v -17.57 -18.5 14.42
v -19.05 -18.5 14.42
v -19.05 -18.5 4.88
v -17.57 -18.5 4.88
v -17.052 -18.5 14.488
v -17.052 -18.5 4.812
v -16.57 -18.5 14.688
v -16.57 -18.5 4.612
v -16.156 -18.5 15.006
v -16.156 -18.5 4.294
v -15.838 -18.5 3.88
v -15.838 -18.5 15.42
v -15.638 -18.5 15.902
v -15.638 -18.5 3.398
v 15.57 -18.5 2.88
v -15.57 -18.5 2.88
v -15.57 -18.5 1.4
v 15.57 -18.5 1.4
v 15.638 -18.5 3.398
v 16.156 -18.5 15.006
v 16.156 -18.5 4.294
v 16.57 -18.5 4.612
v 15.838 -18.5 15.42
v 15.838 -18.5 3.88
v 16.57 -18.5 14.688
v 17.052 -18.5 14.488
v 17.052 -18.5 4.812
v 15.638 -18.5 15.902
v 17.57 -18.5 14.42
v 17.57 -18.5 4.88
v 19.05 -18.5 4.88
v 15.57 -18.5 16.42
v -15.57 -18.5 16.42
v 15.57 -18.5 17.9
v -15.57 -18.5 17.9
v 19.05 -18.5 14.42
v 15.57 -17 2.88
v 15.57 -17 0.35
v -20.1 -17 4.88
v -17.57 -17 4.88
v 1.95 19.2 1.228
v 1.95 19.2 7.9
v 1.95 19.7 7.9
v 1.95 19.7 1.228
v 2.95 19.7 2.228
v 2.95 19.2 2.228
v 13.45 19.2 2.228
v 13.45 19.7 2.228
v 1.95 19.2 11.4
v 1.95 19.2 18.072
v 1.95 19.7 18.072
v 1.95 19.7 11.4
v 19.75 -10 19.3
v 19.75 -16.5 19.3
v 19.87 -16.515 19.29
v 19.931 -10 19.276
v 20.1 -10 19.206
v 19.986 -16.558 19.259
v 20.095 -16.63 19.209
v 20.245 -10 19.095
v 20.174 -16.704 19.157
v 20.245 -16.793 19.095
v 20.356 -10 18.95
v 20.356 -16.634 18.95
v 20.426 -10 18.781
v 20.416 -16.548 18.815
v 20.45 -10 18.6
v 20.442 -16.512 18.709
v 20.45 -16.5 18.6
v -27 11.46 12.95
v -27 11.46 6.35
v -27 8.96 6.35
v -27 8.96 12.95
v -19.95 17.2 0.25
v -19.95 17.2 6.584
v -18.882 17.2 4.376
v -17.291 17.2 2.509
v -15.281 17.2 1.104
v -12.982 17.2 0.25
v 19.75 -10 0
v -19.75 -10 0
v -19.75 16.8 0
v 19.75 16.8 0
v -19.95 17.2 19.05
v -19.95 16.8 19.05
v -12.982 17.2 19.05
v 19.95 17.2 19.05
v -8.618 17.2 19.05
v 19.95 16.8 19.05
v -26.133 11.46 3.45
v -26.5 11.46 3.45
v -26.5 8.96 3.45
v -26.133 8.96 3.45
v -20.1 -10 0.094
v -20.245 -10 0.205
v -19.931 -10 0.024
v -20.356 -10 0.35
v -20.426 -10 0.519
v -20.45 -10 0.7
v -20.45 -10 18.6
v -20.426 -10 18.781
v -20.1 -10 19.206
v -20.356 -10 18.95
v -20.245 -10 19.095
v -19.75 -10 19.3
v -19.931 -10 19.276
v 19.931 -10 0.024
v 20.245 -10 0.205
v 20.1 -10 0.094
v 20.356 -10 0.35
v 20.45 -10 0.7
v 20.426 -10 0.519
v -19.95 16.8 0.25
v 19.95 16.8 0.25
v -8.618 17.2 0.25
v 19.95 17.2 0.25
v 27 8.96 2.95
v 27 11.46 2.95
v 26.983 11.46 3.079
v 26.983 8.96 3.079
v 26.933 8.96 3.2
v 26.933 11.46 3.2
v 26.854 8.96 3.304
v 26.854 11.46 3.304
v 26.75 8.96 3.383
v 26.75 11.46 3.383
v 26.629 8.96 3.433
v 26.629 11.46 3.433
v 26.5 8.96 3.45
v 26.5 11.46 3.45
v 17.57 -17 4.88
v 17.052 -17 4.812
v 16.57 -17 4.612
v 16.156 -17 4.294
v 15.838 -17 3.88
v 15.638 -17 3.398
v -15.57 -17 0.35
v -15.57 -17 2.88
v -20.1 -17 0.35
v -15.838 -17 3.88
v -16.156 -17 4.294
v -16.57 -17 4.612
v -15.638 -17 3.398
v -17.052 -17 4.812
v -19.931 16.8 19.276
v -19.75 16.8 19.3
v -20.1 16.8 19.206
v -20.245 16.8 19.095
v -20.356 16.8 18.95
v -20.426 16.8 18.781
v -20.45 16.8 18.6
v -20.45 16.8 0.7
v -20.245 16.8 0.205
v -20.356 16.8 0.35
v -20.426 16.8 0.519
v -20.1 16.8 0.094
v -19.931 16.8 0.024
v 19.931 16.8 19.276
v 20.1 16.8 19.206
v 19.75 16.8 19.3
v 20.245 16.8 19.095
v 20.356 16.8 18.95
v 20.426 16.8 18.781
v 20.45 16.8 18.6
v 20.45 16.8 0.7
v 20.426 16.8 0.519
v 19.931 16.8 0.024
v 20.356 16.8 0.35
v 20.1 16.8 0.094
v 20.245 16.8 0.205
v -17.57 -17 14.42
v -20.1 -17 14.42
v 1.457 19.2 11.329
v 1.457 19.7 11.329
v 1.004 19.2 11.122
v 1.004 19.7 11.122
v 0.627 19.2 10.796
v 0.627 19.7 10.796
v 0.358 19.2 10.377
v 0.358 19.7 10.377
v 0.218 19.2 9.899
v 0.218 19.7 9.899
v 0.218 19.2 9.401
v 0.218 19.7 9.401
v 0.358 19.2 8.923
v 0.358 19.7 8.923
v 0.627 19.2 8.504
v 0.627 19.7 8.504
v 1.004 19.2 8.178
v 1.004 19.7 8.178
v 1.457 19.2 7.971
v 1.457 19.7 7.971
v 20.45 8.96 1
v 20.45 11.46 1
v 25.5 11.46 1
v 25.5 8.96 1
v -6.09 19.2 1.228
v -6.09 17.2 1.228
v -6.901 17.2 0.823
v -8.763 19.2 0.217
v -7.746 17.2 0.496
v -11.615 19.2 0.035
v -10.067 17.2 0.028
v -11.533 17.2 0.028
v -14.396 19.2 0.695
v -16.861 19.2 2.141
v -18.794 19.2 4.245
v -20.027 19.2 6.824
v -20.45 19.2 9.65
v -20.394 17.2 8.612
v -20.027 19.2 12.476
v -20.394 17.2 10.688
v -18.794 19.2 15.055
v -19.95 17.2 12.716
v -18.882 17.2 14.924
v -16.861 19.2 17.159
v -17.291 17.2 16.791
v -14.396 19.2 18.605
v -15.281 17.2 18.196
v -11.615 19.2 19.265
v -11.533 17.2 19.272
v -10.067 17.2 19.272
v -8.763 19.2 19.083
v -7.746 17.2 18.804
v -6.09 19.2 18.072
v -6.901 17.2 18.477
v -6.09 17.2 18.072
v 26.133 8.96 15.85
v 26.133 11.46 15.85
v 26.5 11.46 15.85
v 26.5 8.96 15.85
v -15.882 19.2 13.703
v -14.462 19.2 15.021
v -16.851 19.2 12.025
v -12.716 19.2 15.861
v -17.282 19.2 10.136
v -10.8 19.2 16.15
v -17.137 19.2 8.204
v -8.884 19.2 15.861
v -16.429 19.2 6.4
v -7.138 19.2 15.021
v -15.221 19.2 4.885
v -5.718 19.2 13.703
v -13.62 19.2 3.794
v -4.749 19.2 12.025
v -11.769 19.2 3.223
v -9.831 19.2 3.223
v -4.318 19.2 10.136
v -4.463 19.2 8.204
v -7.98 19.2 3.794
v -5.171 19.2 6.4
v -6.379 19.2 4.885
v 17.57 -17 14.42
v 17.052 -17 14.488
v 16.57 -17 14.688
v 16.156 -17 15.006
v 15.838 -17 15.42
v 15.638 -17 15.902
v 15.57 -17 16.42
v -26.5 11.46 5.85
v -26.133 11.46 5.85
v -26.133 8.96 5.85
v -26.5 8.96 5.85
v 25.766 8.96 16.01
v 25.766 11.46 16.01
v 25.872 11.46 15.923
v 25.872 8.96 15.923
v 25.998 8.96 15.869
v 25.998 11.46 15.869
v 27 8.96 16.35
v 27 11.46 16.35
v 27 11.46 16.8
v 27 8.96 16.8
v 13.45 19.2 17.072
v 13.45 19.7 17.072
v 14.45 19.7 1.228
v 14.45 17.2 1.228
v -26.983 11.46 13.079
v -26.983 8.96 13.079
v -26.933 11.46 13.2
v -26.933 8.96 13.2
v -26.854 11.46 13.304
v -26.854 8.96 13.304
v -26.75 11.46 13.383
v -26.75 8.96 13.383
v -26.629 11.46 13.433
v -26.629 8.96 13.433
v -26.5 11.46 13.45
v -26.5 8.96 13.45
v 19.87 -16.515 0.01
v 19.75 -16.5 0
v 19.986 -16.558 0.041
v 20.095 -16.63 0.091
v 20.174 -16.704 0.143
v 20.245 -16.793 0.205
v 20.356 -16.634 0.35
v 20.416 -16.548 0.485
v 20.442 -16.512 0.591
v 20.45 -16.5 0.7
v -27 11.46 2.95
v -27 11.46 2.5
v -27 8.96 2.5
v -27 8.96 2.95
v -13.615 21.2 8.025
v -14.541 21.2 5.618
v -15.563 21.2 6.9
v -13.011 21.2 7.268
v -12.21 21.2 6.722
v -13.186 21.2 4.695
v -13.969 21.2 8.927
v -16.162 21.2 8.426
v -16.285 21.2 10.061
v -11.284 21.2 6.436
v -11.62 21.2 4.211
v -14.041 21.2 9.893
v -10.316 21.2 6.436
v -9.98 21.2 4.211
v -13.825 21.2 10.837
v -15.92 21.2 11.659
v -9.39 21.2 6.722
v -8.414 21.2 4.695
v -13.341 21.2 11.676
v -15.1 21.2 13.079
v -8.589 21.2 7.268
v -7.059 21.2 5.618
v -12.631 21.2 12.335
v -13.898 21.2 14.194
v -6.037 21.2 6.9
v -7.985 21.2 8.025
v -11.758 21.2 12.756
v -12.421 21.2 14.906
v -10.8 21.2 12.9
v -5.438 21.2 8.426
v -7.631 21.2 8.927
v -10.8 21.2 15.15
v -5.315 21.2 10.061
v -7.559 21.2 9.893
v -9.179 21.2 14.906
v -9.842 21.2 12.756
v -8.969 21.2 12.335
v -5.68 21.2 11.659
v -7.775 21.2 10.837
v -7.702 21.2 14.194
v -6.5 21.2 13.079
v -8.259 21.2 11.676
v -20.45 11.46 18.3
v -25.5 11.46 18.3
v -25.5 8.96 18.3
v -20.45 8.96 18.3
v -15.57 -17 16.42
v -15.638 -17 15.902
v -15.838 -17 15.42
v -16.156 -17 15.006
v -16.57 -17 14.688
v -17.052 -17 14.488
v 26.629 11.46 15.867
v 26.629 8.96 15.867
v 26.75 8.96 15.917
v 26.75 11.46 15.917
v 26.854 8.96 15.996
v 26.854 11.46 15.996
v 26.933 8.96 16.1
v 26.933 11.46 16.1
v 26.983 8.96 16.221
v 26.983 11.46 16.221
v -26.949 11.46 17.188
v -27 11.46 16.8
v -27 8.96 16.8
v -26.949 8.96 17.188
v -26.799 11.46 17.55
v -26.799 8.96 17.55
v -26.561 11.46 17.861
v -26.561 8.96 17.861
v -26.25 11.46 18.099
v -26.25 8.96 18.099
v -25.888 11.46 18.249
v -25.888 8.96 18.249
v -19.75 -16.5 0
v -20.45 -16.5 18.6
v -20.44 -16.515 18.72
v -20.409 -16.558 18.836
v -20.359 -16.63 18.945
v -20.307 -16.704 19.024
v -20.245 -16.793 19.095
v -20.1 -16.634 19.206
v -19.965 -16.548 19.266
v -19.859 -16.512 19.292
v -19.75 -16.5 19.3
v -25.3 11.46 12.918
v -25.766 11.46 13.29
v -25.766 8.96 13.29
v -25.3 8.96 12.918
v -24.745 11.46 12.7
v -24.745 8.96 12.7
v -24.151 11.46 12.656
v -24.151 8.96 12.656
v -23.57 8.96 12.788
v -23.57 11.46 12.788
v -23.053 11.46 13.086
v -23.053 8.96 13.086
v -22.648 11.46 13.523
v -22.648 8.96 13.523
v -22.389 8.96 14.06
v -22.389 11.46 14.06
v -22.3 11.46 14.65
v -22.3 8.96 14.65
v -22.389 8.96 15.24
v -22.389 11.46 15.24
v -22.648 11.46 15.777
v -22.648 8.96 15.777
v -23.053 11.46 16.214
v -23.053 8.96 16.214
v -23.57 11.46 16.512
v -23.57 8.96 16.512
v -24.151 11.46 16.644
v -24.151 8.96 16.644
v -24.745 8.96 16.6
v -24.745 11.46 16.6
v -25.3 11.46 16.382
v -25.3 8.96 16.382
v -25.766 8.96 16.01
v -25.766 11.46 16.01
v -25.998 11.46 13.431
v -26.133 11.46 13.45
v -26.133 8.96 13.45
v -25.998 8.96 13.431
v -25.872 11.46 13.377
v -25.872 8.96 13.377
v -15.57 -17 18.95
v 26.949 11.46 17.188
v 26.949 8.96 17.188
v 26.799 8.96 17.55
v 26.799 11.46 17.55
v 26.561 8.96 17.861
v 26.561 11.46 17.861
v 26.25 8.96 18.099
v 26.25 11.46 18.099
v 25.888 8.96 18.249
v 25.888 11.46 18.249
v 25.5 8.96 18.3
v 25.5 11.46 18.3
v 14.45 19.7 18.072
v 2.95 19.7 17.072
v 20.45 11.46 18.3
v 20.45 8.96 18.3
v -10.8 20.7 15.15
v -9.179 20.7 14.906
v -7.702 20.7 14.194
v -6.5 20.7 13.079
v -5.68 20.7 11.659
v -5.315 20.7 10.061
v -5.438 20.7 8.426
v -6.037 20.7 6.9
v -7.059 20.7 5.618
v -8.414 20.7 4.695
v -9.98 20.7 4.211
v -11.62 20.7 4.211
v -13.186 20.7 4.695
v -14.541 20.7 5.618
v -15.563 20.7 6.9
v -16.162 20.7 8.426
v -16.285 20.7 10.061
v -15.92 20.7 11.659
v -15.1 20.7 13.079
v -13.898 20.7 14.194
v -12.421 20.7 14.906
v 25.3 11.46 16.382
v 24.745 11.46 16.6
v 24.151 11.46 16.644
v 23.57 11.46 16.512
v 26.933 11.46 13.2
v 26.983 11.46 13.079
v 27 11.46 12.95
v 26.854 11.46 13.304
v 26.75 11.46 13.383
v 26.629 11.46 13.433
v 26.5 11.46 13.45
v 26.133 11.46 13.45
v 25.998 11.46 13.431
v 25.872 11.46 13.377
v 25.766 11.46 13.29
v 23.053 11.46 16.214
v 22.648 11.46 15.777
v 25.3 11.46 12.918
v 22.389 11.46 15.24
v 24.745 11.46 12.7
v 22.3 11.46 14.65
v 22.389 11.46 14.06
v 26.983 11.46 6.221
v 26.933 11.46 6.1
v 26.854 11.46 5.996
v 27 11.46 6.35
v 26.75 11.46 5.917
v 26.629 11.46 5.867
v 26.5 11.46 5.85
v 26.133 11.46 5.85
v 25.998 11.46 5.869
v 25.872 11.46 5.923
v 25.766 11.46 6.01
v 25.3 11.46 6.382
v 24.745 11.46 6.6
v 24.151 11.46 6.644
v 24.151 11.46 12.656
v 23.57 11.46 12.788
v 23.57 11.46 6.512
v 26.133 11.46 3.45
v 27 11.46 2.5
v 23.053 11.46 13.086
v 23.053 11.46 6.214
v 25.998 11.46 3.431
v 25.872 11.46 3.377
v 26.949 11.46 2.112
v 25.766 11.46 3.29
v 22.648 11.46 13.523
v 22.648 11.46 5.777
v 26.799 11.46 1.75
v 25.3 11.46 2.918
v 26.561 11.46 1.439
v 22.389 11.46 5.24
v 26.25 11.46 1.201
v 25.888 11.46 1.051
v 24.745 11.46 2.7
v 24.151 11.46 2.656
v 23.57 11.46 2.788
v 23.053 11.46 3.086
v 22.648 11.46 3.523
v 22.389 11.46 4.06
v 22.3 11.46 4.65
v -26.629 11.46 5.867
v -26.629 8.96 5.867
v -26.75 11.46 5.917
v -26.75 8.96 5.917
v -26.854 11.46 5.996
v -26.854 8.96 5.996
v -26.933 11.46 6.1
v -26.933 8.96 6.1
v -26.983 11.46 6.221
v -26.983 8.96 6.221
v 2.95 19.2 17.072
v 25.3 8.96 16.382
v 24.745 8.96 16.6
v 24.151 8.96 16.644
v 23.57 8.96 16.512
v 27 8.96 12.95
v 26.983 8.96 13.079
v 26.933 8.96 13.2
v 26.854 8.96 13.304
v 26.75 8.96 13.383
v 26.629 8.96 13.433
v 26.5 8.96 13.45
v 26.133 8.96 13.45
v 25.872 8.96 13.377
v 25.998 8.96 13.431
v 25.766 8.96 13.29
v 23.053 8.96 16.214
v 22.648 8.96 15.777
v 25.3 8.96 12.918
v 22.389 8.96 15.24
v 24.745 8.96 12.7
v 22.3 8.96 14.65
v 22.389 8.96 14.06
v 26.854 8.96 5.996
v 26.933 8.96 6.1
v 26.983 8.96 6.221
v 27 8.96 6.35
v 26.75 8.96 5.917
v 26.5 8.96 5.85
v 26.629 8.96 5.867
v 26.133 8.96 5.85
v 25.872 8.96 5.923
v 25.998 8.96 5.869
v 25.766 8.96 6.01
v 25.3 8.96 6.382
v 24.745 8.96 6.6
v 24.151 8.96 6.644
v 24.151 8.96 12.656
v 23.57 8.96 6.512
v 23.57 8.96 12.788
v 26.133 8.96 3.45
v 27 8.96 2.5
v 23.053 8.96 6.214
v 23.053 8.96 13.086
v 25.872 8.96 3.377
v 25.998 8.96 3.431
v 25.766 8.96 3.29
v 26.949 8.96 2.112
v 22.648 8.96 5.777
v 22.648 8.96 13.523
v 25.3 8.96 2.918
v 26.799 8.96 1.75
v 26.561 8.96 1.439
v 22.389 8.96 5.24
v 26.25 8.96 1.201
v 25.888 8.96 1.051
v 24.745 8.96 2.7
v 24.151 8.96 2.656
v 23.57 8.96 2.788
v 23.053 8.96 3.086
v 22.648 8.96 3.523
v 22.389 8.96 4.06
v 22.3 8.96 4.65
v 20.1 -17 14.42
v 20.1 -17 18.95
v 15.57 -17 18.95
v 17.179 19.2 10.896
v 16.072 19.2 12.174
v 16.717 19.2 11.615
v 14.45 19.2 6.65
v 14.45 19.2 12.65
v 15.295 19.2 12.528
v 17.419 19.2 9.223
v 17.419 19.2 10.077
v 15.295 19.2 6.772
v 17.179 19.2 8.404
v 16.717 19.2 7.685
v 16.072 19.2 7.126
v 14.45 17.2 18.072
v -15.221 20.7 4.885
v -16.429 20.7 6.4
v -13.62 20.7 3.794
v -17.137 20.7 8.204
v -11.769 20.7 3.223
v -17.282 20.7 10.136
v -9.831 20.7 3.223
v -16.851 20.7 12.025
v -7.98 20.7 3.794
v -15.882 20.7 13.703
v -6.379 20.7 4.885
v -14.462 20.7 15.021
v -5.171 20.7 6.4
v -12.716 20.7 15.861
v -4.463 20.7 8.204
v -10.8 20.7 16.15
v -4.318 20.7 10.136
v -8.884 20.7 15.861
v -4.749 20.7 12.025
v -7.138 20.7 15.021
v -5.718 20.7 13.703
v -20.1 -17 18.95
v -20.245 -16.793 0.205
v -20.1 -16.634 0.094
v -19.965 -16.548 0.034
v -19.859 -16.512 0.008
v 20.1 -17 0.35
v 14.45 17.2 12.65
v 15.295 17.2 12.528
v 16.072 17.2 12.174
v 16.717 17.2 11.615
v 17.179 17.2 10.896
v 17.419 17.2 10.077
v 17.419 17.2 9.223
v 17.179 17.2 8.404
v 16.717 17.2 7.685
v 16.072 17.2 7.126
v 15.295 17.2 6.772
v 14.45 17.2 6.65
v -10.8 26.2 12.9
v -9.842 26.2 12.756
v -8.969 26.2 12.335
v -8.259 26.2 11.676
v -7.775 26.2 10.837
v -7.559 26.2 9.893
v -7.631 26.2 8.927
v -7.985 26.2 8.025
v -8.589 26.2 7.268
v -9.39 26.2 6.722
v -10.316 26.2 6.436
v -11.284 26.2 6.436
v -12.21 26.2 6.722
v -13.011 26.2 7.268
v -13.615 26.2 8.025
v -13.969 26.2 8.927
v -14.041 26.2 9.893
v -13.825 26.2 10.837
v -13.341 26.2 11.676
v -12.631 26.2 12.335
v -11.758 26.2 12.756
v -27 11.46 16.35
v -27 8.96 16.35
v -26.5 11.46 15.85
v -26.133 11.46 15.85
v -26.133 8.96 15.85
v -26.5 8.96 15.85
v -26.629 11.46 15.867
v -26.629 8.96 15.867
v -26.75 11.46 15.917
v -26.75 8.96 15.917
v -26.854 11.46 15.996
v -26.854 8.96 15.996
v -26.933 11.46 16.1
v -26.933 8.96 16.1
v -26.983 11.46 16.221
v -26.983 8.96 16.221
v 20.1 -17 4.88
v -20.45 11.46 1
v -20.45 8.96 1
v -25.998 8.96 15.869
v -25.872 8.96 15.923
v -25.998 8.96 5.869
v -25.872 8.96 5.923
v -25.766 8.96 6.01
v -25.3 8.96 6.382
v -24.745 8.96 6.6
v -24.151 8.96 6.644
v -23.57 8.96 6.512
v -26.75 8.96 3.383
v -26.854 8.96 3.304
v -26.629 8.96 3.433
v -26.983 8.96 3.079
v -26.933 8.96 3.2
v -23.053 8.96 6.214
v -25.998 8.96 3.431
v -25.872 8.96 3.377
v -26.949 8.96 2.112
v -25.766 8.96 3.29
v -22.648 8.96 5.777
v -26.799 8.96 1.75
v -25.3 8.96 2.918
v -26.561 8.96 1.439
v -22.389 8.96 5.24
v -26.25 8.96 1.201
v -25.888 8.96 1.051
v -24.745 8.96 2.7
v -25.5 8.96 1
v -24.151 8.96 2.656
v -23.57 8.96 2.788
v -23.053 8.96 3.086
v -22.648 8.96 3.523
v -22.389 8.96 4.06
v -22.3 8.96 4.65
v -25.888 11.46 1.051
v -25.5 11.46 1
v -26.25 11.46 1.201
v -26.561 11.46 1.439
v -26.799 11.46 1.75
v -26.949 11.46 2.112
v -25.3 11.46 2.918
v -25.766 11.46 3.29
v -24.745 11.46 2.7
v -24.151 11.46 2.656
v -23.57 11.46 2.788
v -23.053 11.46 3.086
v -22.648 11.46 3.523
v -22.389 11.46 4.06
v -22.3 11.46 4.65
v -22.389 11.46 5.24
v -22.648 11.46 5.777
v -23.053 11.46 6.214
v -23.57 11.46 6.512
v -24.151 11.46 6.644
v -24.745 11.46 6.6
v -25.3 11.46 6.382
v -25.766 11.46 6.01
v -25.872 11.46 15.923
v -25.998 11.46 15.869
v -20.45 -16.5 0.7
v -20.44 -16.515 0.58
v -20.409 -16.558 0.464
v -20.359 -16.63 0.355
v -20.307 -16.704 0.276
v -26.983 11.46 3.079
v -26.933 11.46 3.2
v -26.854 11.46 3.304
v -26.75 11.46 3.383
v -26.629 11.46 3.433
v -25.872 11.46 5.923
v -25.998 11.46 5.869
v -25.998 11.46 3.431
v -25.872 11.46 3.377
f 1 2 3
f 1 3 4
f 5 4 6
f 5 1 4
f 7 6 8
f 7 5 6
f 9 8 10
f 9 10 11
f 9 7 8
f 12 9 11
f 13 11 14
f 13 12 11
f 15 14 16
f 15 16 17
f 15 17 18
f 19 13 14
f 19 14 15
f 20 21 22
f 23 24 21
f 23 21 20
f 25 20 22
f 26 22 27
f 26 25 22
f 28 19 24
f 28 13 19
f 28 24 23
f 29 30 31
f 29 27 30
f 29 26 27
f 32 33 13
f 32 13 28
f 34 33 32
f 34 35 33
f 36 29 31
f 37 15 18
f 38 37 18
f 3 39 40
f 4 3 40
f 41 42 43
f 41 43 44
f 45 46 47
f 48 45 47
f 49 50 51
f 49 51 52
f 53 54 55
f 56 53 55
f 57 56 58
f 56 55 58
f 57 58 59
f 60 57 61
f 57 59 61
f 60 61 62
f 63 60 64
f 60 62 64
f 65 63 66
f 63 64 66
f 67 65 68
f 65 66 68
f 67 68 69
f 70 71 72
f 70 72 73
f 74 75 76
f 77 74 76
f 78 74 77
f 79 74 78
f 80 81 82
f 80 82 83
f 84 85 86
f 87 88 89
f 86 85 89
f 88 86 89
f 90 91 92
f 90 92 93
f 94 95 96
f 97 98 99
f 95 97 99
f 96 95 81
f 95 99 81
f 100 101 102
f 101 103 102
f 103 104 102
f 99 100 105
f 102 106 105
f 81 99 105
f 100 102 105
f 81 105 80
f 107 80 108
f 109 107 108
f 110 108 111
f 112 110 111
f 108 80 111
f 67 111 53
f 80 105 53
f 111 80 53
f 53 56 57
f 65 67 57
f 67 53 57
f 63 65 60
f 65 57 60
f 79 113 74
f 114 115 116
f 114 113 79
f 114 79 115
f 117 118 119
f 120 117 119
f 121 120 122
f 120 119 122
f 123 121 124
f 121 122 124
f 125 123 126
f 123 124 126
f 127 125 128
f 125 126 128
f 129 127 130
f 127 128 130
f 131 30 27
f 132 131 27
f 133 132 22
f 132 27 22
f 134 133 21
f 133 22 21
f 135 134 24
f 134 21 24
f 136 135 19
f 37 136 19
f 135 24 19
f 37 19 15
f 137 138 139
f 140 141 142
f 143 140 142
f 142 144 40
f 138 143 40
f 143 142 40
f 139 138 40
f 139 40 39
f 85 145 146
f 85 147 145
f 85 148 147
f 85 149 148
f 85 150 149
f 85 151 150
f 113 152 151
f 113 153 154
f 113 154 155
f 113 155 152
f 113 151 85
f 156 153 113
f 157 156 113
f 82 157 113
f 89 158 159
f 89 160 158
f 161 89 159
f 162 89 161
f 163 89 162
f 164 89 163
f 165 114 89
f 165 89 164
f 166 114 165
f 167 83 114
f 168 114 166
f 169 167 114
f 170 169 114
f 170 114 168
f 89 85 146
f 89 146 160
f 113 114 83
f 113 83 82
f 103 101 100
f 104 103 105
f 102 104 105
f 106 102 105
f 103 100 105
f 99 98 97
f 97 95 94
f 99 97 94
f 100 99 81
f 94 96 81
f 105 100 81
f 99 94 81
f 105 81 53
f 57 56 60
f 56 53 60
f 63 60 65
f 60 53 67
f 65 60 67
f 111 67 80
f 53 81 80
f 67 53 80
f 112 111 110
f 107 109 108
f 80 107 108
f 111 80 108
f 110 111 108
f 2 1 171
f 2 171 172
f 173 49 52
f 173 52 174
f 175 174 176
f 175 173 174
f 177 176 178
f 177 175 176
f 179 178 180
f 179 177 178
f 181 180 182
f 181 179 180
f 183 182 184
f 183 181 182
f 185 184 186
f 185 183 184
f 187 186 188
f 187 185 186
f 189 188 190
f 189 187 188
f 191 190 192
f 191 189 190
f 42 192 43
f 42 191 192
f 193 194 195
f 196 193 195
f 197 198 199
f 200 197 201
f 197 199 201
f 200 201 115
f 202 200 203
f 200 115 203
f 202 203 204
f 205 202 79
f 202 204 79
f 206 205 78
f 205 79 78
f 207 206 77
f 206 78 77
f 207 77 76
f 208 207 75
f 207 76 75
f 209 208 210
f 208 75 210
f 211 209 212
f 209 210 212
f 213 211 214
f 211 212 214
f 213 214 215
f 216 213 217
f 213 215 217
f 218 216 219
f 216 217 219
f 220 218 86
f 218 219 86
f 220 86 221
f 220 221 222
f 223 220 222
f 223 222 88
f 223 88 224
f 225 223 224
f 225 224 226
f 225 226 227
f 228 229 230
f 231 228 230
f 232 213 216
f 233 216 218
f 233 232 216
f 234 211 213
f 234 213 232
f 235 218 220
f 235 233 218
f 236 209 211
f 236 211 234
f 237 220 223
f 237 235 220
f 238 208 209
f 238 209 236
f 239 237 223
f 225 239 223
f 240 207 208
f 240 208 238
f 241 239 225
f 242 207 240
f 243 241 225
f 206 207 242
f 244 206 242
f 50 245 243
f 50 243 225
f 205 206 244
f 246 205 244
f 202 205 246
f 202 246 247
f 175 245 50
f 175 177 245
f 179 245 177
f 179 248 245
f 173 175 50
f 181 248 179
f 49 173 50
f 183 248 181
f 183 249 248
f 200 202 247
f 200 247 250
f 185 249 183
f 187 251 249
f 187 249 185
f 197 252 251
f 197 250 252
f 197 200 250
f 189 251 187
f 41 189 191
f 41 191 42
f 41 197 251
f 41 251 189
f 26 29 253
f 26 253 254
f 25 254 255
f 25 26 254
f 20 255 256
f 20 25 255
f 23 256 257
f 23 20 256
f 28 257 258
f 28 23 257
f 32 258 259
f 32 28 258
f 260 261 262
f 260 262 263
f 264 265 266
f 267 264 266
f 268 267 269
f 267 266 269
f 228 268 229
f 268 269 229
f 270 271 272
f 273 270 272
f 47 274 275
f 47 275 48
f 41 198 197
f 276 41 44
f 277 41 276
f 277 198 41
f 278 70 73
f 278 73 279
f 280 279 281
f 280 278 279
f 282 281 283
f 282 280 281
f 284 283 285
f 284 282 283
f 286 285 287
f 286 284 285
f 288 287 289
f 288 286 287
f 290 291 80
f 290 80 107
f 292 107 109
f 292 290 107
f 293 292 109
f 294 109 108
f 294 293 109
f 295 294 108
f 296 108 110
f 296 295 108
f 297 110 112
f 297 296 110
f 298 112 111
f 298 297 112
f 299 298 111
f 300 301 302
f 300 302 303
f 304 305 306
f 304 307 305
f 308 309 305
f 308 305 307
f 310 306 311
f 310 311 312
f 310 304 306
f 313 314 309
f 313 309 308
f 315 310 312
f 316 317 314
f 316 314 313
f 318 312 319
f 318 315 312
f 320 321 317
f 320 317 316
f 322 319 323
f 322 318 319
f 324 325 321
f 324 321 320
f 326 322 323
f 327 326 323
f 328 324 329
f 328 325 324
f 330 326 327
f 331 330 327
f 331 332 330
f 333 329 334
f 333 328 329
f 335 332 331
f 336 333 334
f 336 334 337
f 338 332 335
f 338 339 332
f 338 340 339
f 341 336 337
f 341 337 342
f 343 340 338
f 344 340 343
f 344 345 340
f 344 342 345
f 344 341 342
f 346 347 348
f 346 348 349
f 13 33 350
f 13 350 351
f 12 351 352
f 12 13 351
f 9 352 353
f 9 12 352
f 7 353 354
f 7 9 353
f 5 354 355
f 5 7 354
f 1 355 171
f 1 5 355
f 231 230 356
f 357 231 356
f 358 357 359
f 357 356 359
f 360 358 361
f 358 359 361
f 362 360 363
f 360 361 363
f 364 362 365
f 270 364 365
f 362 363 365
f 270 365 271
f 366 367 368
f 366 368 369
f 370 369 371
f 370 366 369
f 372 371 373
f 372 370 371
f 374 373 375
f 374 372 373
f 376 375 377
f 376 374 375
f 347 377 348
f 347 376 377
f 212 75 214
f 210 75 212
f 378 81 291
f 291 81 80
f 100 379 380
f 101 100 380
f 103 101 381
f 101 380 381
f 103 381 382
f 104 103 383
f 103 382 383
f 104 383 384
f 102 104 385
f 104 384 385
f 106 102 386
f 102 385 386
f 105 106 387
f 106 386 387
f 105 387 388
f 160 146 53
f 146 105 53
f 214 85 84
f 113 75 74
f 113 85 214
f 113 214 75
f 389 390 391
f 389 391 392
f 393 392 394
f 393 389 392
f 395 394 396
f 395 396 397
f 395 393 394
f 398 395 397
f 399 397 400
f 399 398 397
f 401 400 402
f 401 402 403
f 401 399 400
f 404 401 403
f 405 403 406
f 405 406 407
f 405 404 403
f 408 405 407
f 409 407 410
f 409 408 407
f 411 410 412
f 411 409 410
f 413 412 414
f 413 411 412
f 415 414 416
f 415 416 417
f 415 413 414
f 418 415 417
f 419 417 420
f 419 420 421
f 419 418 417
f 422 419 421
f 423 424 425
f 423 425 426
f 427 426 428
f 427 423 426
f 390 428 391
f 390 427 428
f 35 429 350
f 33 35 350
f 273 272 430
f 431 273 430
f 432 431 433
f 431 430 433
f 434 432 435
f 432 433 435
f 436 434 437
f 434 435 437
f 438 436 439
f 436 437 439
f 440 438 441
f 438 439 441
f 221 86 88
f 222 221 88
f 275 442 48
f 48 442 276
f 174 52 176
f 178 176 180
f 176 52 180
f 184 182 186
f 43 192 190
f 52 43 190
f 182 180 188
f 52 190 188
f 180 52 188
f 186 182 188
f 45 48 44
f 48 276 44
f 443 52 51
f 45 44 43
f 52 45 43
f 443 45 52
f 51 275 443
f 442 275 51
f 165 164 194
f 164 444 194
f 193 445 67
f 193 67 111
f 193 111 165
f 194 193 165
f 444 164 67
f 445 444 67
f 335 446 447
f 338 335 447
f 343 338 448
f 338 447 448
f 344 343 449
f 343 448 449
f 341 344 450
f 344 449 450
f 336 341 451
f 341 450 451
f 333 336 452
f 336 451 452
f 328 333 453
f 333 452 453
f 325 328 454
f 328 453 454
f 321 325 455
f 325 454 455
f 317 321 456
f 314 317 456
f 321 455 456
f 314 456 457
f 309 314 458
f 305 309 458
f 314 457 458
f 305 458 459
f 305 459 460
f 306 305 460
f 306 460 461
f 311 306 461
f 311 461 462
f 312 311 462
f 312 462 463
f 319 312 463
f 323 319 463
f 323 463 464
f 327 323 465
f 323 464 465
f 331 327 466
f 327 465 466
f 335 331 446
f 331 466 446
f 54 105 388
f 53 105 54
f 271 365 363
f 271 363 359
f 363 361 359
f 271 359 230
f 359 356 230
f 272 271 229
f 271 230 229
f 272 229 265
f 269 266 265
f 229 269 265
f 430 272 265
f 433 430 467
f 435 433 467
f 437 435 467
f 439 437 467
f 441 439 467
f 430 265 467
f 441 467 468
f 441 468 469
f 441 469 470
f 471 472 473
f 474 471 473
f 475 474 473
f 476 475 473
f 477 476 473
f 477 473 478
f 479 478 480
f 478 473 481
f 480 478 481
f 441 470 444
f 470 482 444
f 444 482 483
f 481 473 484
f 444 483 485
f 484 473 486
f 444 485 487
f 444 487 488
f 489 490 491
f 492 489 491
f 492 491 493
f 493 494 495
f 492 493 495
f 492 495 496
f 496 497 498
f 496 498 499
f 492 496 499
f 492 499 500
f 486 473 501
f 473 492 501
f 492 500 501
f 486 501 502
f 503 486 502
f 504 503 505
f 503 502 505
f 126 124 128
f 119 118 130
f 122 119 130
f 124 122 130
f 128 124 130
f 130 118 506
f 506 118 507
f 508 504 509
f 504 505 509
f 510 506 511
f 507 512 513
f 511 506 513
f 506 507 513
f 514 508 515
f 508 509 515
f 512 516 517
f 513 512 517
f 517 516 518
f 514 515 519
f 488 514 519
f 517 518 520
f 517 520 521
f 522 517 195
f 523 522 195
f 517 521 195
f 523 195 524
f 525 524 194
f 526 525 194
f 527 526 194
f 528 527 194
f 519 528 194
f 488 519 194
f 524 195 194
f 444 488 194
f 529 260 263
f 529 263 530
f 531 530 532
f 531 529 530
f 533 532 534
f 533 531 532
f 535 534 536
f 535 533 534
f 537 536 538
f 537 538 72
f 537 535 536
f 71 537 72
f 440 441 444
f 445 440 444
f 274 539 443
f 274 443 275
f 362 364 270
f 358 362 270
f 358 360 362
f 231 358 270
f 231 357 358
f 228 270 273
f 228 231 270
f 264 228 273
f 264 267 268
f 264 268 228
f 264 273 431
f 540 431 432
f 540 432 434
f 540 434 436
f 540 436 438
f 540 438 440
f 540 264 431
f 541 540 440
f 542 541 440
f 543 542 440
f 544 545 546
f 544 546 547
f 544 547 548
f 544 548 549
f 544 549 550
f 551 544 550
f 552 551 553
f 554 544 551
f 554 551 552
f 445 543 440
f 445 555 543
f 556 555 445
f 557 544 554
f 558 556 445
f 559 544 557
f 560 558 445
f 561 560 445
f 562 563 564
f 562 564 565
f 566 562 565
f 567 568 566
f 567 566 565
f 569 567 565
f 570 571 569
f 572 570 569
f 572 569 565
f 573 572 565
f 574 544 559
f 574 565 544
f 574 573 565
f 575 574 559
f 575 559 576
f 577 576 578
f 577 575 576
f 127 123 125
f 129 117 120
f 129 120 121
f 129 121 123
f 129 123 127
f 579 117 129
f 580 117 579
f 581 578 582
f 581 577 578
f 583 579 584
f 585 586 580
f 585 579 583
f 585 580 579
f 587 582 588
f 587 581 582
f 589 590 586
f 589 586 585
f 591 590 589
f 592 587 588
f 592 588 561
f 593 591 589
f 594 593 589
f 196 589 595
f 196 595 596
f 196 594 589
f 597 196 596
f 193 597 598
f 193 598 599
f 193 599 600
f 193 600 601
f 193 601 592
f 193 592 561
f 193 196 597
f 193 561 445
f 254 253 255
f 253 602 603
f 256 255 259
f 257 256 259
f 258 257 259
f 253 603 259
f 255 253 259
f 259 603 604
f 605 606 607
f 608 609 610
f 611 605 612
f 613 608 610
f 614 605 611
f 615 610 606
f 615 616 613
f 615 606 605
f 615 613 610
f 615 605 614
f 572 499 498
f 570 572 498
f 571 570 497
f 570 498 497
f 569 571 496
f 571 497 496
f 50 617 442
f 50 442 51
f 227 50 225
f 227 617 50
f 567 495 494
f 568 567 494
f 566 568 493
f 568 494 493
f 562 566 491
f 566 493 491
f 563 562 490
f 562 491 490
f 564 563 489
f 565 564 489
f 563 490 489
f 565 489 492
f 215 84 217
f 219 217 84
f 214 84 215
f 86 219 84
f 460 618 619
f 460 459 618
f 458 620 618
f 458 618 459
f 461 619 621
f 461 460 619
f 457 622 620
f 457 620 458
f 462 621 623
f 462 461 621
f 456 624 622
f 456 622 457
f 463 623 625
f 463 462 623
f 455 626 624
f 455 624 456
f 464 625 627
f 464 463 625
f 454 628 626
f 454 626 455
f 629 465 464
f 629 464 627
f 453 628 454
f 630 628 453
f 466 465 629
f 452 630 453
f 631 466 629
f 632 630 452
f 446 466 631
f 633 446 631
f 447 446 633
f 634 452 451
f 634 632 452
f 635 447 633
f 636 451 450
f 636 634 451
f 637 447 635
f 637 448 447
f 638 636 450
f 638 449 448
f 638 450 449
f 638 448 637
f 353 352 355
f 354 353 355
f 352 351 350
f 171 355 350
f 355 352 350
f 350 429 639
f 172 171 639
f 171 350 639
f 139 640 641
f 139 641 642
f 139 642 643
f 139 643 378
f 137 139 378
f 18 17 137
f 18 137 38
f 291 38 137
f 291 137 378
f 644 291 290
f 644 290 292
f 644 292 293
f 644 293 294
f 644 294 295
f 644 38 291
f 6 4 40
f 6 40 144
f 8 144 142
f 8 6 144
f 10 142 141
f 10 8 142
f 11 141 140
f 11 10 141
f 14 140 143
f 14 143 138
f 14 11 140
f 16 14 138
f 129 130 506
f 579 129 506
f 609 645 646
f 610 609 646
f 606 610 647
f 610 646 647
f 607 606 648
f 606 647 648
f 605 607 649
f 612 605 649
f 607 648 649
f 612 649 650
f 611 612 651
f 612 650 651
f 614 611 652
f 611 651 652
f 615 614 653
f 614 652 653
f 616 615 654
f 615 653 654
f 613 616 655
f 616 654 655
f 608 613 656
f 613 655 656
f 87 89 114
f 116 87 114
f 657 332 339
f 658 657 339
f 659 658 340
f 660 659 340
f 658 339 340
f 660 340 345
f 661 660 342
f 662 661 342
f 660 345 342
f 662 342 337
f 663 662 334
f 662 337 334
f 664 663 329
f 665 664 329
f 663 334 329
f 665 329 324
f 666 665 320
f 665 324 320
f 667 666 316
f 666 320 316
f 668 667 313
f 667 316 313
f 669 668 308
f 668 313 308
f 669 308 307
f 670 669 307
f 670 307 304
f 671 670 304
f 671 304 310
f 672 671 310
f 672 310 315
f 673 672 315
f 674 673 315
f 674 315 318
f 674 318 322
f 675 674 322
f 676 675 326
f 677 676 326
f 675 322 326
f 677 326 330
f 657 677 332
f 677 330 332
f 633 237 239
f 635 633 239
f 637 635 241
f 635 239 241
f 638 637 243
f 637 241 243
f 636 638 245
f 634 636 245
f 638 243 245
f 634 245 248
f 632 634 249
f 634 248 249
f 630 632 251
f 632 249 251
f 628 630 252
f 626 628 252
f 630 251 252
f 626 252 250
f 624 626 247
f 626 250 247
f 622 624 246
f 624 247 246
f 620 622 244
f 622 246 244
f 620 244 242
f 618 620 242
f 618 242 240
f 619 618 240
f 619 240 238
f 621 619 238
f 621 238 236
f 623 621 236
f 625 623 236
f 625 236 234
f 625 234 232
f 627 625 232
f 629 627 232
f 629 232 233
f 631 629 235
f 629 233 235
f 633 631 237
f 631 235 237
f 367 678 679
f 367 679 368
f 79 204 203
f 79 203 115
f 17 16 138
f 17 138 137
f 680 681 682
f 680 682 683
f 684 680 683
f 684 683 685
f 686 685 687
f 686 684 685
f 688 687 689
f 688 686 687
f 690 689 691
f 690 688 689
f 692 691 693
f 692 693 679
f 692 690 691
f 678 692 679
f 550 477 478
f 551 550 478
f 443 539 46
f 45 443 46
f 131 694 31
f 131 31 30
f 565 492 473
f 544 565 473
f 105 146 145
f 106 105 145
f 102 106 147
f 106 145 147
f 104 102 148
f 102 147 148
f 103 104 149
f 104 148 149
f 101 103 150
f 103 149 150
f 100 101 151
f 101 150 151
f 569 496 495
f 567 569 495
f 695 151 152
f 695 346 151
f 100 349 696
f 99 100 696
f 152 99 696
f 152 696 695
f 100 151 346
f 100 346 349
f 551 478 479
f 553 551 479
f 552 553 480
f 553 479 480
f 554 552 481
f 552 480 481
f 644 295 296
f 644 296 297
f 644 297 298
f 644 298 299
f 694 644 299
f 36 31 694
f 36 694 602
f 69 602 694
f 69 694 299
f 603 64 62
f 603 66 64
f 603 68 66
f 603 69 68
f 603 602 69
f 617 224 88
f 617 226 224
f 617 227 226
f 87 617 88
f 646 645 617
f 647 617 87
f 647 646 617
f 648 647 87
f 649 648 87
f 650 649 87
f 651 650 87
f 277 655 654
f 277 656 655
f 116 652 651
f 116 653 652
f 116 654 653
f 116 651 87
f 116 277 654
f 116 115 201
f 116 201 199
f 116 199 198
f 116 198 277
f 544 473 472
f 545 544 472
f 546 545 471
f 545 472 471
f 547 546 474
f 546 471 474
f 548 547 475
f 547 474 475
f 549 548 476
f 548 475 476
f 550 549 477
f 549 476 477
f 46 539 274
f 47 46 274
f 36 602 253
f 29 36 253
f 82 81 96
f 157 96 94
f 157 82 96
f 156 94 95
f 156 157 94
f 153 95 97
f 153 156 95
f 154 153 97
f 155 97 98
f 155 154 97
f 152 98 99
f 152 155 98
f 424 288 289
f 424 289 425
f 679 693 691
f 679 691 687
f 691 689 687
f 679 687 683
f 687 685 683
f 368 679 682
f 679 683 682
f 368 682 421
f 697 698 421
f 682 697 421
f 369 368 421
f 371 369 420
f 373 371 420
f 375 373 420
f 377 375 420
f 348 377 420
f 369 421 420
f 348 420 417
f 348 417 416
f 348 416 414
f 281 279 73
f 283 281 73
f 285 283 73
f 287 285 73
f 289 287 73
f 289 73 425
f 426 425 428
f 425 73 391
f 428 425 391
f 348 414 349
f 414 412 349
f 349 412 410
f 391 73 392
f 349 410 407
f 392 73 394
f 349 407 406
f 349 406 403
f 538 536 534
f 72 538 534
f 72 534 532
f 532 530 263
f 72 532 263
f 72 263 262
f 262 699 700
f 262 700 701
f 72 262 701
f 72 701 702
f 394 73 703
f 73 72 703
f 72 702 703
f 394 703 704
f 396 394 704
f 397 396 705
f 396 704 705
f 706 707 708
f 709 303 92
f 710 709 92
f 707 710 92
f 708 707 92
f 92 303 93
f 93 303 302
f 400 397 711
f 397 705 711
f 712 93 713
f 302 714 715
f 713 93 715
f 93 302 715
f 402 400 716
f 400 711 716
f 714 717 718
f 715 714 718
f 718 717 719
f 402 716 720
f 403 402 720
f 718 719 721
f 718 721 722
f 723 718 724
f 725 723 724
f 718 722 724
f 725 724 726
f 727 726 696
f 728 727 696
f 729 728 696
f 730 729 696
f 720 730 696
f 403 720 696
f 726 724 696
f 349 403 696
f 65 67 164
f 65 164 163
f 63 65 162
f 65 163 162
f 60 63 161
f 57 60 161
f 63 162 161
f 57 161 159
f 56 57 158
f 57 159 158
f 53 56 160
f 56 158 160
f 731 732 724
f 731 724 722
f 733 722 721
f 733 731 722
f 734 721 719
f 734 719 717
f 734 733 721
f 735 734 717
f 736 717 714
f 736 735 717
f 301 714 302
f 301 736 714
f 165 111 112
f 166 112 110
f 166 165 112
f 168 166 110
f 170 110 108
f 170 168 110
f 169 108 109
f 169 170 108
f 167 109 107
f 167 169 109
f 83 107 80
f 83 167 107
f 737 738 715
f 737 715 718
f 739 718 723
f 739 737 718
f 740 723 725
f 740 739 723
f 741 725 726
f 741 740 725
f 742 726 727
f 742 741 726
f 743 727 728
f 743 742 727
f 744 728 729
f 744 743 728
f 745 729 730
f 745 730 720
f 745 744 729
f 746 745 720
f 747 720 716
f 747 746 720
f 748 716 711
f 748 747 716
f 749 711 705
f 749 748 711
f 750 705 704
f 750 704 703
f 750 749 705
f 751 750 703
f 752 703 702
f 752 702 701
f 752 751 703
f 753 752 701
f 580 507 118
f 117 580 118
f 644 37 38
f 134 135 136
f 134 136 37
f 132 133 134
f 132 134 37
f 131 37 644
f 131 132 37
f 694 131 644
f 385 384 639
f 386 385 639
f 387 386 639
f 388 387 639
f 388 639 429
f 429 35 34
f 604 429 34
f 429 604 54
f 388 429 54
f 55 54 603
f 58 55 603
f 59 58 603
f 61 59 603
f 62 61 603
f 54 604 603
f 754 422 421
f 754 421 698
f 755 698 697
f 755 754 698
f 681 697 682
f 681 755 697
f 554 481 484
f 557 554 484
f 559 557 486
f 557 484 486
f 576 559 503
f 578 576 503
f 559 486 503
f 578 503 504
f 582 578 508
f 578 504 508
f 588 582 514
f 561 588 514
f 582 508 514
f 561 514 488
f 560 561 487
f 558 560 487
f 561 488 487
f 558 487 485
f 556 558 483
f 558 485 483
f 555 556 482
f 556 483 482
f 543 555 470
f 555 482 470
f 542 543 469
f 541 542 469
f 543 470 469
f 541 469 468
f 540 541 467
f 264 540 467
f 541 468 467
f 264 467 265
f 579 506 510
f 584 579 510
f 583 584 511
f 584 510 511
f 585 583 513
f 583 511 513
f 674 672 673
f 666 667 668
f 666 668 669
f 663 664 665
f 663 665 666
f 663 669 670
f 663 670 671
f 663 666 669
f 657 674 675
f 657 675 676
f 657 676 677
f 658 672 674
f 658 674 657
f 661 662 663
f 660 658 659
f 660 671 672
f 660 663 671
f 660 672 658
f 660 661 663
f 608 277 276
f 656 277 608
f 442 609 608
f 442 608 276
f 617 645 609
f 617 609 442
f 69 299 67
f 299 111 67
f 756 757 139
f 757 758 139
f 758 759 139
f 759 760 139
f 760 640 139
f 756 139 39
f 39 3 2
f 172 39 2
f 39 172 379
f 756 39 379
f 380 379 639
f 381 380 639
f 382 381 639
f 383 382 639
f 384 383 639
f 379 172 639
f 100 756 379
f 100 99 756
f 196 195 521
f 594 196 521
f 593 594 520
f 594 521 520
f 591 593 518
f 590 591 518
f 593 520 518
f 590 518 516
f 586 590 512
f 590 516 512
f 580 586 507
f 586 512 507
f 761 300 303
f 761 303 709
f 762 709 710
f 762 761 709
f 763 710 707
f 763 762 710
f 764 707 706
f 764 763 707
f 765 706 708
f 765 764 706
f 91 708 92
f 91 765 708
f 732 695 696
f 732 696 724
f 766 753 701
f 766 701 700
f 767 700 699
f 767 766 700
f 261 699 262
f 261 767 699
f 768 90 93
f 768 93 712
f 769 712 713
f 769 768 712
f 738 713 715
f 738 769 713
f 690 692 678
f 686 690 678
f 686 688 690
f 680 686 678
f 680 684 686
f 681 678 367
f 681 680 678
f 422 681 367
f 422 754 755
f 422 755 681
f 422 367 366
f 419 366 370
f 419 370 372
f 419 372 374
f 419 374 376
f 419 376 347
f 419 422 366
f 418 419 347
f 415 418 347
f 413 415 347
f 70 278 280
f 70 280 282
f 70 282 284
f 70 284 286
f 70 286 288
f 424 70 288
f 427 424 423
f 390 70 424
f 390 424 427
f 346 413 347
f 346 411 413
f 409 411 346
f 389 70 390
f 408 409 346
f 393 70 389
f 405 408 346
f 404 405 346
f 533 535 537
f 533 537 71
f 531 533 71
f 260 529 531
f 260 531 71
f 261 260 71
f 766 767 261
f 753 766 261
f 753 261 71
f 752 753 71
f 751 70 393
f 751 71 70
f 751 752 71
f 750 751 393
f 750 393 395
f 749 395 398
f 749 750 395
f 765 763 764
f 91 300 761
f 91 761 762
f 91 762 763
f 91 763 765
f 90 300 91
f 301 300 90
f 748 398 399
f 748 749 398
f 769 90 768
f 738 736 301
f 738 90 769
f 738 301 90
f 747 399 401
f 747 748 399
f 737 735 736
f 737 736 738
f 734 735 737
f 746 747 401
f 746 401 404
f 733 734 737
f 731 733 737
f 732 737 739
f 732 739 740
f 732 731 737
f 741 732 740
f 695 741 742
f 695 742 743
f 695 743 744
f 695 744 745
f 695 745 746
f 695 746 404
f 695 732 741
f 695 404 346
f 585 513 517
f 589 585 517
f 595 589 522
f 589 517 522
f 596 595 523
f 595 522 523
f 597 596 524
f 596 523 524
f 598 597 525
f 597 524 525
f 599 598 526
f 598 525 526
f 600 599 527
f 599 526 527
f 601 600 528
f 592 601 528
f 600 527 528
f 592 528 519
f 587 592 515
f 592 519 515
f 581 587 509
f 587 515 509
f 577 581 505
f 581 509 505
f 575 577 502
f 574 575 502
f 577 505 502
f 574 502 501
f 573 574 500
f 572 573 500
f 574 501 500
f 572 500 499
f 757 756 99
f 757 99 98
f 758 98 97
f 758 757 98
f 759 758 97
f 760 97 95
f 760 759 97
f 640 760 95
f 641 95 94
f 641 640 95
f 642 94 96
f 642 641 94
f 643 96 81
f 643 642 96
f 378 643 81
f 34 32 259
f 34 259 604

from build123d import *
from OCP.BRepFilletAPI import BRepFilletAPI_MakeChamfer

# Parameters (mm, degrees)
SKETCH1_W            = 40.9
SKETCH1_H            = 20
BOSS_EXTRUDE1_DEPTH  = 19.3
SKETCH2_W            = 40.9
SKETCH2_H            = 19.3
BOSS_EXTRUDE2_DEPTH  = 6.8
SKETCH3_W            = 40.9
SKETCH3_H            = 19.3
BOSS_EXTRUDE3_DEPTH  = 8.5
CHAMFER1_SIZE        = 2
CHAMFER1_SIZE2       = 1.400415076
CUT_EXTRUDE1_DEPTH   = 1.5
SKETCH5_W            = 39.9
SKETCH5_H            = 18.8
BOSS_EXTRUDE4_DEPTH  = 0.4
BOSS_EXTRUDE5_DEPTH  = 2
SKETCH7_R            = 6.5
BOSS_EXTRUDE6_DEPTH  = 1.5
SKETCH8_R            = 5.5
BOSS_EXTRUDE7_DEPTH  = 0.5
SKETCH9_R            = 3.25
BOSS_EXTRUDE8_DEPTH  = 5
SKETCH10_W           = 10.5
SKETCH10_H           = 14.844987384
BOSS_EXTRUDE9_DEPTH  = 0.5
FILLET1_R            = 0.7
FILLET2_R            = 0.7
FILLET3_R            = 0.7
BOSS_EXTRUDE10_START = -5.74
BOSS_EXTRUDE10_DEPTH = 2.5


with BuildPart() as part:
    # Sketch1 → Boss-Extrude1 (new body)
    with BuildSketch(Plane.XY):
        Rectangle(SKETCH1_W, SKETCH1_H)
    extrude(amount=BOSS_EXTRUDE1_DEPTH)

    # Fillet1
    fillet1_edges = [part.edges().sort_by_distance(p)[0] for p in [
        (-20.45, 0, 19.3),
        (20.45, 0, 19.3),
        (-20.45, 0, 0),
        (20.45, 0, 0),
    ]]
    fillet(fillet1_edges, radius=FILLET1_R)



with BuildPart() as body_2:
    # Sketch2 → Boss-Extrude2 (new body)
    with BuildSketch(Plane(origin=(0, 10, 0), x_dir=(1, 0, 0), z_dir=(0, 1, 0))):
        with Locations((0, -9.65)):
            Rectangle(SKETCH2_W, SKETCH2_H)
    extrude(amount=BOSS_EXTRUDE2_DEPTH)

    # Sketch5 → Boss-Extrude4 (add)
    with BuildSketch(Plane(origin=(0, 16.8, 0), x_dir=(1, 0, 0), z_dir=(0, 1, 0))):
        with Locations((0, -9.65)):
            Rectangle(SKETCH5_W, SKETCH5_H)
    extrude(amount=BOSS_EXTRUDE4_DEPTH)

    # Sketch6 → Boss-Extrude5 (add)
    with BuildSketch(Plane(origin=(0, 17.2, 0), x_dir=(1, 0, 0), z_dir=(0, 1, 0))):
        with BuildLine():
            Line((14.45, -18.072493692), (14.45, -12.65))
            ThreePointArc((14.45, -12.65), (17.45, -9.65), (14.45, -6.65))
            Line((14.45, -6.65), (14.45, -1.227506308))
            Line((14.45, -1.227506308), (-6.09, -1.227506308))
            ThreePointArc((-6.09, -1.227506308), (-20.45, -9.65), (-6.09, -18.072493692))
            Line((-6.09, -18.072493692), (14.45, -18.072493692))
        make_face()
    extrude(amount=BOSS_EXTRUDE5_DEPTH)

    # Sketch7 → Boss-Extrude6 (add)
    with BuildSketch(Plane(origin=(0, 19.2, 0), x_dir=(1, 0, 0), z_dir=(0, 1, 0))):
        with Locations(Location((-10.8, -9.65, 0), (0, 0, 270))):
            Circle(SKETCH7_R)
    extrude(amount=BOSS_EXTRUDE6_DEPTH)

    # Sketch8 → Boss-Extrude7 (add)
    with BuildSketch(Plane(origin=(0, 20.7, 0), x_dir=(1, 0, 0), z_dir=(0, 1, 0))):
        with Locations(Location((-10.8, -9.65, 0), (0, 0, 270))):
            Circle(SKETCH8_R)
    extrude(amount=BOSS_EXTRUDE7_DEPTH)

    # Sketch9 → Boss-Extrude8 (add)
    with BuildSketch(Plane(origin=(0, 21.2, 0), x_dir=(1, 0, 0), z_dir=(0, 1, 0))):
        with Locations(Location((-10.8, -9.65, 0), (0, 0, 270))):
            Circle(SKETCH9_R)
    extrude(amount=BOSS_EXTRUDE8_DEPTH)

    # Sketch10 → Boss-Extrude9 (add)
    with BuildSketch(Plane(origin=(0, 19.2, 0), x_dir=(1, 0, 0), z_dir=(0, 1, 0))):
        with BuildLine():
            Line((1.95, -1.227506308), (14.45, -1.227506308))
            Line((14.45, -1.227506308), (14.45, -18.072493692))
            Line((14.45, -18.072493692), (1.95, -18.072493692))
            Line((1.95, -18.072493692), (1.95, -11.4))
            ThreePointArc((1.95, -11.4), (0.2, -9.65), (1.95, -7.9))
            Line((1.95, -7.9), (1.95, -1.227506308))
        make_face()
        with Locations((8.2, -9.65)):
            Rectangle(SKETCH10_W, SKETCH10_H, mode=Mode.SUBTRACT)
    extrude(amount=BOSS_EXTRUDE9_DEPTH)

    # Fillet2
    fillet2_edges = [body_2.edges().sort_by_distance(p)[0] for p in [
        (20.45, 13.4, 19.3),
        (-20.45, 13.4, 19.3),
        (-20.45, 13.4, 0),
        (20.45, 13.4, 0),
    ]]
    fillet(fillet2_edges, radius=FILLET2_R)


with BuildPart() as body_3:
    # Sketch3 → Boss-Extrude3 (new body)
    with BuildSketch(Plane.XZ.offset(10)):
        with Locations((0, 9.65)):
            Rectangle(SKETCH3_W, SKETCH3_H)
    extrude(amount=BOSS_EXTRUDE3_DEPTH)

    # Chamfer1: one chamfer whose edges measure the first distance from different faces: ONE call of the kernel's chamfer builder (chamfer() names one face for all edges)
    chamfer1_edges_1 = [body_3.edges().sort_by_distance(p)[0] for p in [
        (20.45, -18.5, 9.65),
    ]]
    chamfer1_side_1 = [body_3.faces().sort_by_distance(p)[0] for p in [
        (20.45, -14.25, 9.65),
    ]]
    chamfer1_edges_2 = [body_3.edges().sort_by_distance(p)[0] for p in [
        (0, -18.5, 19.3),
    ]]
    chamfer1_side_2 = [body_3.faces().sort_by_distance(p)[0] for p in [
        (0, -14.25, 19.3),
    ]]
    chamfer1_edges_3 = [body_3.edges().sort_by_distance(p)[0] for p in [
        (-20.45, -18.5, 9.65),
    ]]
    chamfer1_side_3 = [body_3.faces().sort_by_distance(p)[0] for p in [
        (-20.45, -14.25, 9.65),
    ]]
    chamfer1_edges_4 = [body_3.edges().sort_by_distance(p)[0] for p in [
        (0, -18.5, 0),
    ]]
    chamfer1_side_4 = [body_3.faces().sort_by_distance(p)[0] for p in [
        (0, -14.25, 0),
    ]]
    chamfer1 = BRepFilletAPI_MakeChamfer(body_3.part.solid().wrapped)
    for e in chamfer1_edges_1:
        chamfer1.Add(CHAMFER1_SIZE, CHAMFER1_SIZE2, e.wrapped, chamfer1_side_1[0].wrapped)  # the first distance lies on this face
    for e in chamfer1_edges_2:
        chamfer1.Add(CHAMFER1_SIZE, CHAMFER1_SIZE2, e.wrapped, chamfer1_side_2[0].wrapped)  # the first distance lies on this face
    for e in chamfer1_edges_3:
        chamfer1.Add(CHAMFER1_SIZE, CHAMFER1_SIZE2, e.wrapped, chamfer1_side_3[0].wrapped)  # the first distance lies on this face
    for e in chamfer1_edges_4:
        chamfer1.Add(CHAMFER1_SIZE, CHAMFER1_SIZE2, e.wrapped, chamfer1_side_4[0].wrapped)  # the first distance lies on this face
    add(Compound.cast(chamfer1.Shape()), mode=Mode.REPLACE)

    # Sketch4 → Cut-Extrude1 (cut)
    with BuildSketch(Plane.XZ.offset(18.5)):
        with BuildLine():
            Line((-20.45, 19.3), (-15.57, 19.3))
            Line((-15.57, 19.3), (-15.57, 16.42))
            ThreePointArc((-15.57, 16.42), (-16.155786438, 15.005786438), (-17.57, 14.42))
            Line((-17.57, 14.42), (-20.45, 14.42))
            Line((-20.45, 14.42), (-20.45, 19.3))
        make_face()
        with BuildLine():
            Line((20.45, 14.42), (17.57, 14.42))
            ThreePointArc((17.57, 14.42), (16.155786438, 15.005786438), (15.57, 16.42))
            Line((15.57, 16.42), (15.57, 19.3))
            Line((15.57, 19.3), (20.45, 19.3))
            Line((20.45, 19.3), (20.45, 14.42))
        make_face()
        with BuildLine():
            Line((20.45, 0), (20.45, 4.88))
            Line((20.45, 4.88), (17.57, 4.88))
            ThreePointArc((17.57, 4.88), (16.155786438, 4.294213562), (15.57, 2.88))
            Line((15.57, 2.88), (15.57, 0))
            Line((15.57, 0), (20.45, 0))
        make_face()
        with BuildLine():
            Line((-20.45, 4.88), (-17.57, 4.88))
            ThreePointArc((-17.57, 4.88), (-16.155786438, 4.294213562), (-15.57, 2.88))
            Line((-15.57, 2.88), (-15.57, 0))
            Line((-15.57, 0), (-20.45, 0))
            Line((-20.45, 0), (-20.45, 4.88))
        make_face()
    extrude(amount=-CUT_EXTRUDE1_DEPTH, mode=Mode.SUBTRACT)

    # Fillet3
    fillet3_edges = [body_3.edges().sort_by_distance(p)[0] for p in [
        (-20.45, -13.25, 19.3),
        (20.45, -13.25, 19.3),
        (20.45, -13.25, 0),
        (-20.45, -13.25, 0),
    ]]
    fillet(fillet3_edges, radius=FILLET3_R)


with BuildPart() as part_1:
    add(part.part)

    add(body_2.part)  # Boss-Extrude10 merges body 2
    # Sketch11 → Boss-Extrude10 (add)
    with BuildSketch(Plane(origin=(0, 17.2, 0), x_dir=(1, 0, 0), z_dir=(0, 1, 0)).offset(BOSS_EXTRUDE10_START)):
        with BuildLine():
            Line((20.45, -1), (25.5, -1))
            ThreePointArc((25.5, -1), (26.560660172, -1.439339828), (27, -2.5))
            Line((27, -2.5), (27, -2.95))
            ThreePointArc((27, -2.95), (26.853553391, -3.303553391), (26.5, -3.45))
            Line((26.5, -3.45), (26.133030278, -3.45))
            ThreePointArc((26.133030278, -3.45), (25.933030278, -3.408257569), (25.766424222, -3.29))
            ThreePointArc((25.766424222, -3.29), (22.3, -4.65), (25.766424222, -6.01))
            ThreePointArc((25.766424222, -6.01), (25.933030278, -5.891742431), (26.133030278, -5.85))
            Line((26.133030278, -5.85), (26.5, -5.85))
            ThreePointArc((26.5, -5.85), (26.853553391, -5.996446609), (27, -6.35))
            Line((27, -6.35), (27, -12.95))
            ThreePointArc((27, -12.95), (26.853553391, -13.303553391), (26.5, -13.45))
            Line((26.5, -13.45), (26.133030278, -13.45))
            ThreePointArc((26.133030278, -13.45), (25.933030278, -13.408257569), (25.766424222, -13.29))
            ThreePointArc((25.766424222, -13.29), (22.3, -14.65), (25.766424222, -16.01))
            ThreePointArc((25.766424222, -16.01), (25.933030278, -15.891742431), (26.133030278, -15.85))
            Line((26.133030278, -15.85), (26.5, -15.85))
            ThreePointArc((26.5, -15.85), (26.853553391, -15.996446609), (27, -16.35))
            Line((27, -16.35), (27, -16.8))
            ThreePointArc((27, -16.8), (26.560660172, -17.860660172), (25.5, -18.3))
            Line((25.5, -18.3), (20.45, -18.3))
            Line((20.45, -18.3), (20.45, -1))
        make_face()
    boss_extrude10 = extrude(amount=-BOSS_EXTRUDE10_DEPTH)

    # Mirror1: Boss-Extrude10 across plane
    add(boss_extrude10.mirror(Plane(origin=(0, 0, 0), x_dir=(0, 0, 1), z_dir=(1, 0, 0))))


solid = Compound([body_3.part, part_1.part])
